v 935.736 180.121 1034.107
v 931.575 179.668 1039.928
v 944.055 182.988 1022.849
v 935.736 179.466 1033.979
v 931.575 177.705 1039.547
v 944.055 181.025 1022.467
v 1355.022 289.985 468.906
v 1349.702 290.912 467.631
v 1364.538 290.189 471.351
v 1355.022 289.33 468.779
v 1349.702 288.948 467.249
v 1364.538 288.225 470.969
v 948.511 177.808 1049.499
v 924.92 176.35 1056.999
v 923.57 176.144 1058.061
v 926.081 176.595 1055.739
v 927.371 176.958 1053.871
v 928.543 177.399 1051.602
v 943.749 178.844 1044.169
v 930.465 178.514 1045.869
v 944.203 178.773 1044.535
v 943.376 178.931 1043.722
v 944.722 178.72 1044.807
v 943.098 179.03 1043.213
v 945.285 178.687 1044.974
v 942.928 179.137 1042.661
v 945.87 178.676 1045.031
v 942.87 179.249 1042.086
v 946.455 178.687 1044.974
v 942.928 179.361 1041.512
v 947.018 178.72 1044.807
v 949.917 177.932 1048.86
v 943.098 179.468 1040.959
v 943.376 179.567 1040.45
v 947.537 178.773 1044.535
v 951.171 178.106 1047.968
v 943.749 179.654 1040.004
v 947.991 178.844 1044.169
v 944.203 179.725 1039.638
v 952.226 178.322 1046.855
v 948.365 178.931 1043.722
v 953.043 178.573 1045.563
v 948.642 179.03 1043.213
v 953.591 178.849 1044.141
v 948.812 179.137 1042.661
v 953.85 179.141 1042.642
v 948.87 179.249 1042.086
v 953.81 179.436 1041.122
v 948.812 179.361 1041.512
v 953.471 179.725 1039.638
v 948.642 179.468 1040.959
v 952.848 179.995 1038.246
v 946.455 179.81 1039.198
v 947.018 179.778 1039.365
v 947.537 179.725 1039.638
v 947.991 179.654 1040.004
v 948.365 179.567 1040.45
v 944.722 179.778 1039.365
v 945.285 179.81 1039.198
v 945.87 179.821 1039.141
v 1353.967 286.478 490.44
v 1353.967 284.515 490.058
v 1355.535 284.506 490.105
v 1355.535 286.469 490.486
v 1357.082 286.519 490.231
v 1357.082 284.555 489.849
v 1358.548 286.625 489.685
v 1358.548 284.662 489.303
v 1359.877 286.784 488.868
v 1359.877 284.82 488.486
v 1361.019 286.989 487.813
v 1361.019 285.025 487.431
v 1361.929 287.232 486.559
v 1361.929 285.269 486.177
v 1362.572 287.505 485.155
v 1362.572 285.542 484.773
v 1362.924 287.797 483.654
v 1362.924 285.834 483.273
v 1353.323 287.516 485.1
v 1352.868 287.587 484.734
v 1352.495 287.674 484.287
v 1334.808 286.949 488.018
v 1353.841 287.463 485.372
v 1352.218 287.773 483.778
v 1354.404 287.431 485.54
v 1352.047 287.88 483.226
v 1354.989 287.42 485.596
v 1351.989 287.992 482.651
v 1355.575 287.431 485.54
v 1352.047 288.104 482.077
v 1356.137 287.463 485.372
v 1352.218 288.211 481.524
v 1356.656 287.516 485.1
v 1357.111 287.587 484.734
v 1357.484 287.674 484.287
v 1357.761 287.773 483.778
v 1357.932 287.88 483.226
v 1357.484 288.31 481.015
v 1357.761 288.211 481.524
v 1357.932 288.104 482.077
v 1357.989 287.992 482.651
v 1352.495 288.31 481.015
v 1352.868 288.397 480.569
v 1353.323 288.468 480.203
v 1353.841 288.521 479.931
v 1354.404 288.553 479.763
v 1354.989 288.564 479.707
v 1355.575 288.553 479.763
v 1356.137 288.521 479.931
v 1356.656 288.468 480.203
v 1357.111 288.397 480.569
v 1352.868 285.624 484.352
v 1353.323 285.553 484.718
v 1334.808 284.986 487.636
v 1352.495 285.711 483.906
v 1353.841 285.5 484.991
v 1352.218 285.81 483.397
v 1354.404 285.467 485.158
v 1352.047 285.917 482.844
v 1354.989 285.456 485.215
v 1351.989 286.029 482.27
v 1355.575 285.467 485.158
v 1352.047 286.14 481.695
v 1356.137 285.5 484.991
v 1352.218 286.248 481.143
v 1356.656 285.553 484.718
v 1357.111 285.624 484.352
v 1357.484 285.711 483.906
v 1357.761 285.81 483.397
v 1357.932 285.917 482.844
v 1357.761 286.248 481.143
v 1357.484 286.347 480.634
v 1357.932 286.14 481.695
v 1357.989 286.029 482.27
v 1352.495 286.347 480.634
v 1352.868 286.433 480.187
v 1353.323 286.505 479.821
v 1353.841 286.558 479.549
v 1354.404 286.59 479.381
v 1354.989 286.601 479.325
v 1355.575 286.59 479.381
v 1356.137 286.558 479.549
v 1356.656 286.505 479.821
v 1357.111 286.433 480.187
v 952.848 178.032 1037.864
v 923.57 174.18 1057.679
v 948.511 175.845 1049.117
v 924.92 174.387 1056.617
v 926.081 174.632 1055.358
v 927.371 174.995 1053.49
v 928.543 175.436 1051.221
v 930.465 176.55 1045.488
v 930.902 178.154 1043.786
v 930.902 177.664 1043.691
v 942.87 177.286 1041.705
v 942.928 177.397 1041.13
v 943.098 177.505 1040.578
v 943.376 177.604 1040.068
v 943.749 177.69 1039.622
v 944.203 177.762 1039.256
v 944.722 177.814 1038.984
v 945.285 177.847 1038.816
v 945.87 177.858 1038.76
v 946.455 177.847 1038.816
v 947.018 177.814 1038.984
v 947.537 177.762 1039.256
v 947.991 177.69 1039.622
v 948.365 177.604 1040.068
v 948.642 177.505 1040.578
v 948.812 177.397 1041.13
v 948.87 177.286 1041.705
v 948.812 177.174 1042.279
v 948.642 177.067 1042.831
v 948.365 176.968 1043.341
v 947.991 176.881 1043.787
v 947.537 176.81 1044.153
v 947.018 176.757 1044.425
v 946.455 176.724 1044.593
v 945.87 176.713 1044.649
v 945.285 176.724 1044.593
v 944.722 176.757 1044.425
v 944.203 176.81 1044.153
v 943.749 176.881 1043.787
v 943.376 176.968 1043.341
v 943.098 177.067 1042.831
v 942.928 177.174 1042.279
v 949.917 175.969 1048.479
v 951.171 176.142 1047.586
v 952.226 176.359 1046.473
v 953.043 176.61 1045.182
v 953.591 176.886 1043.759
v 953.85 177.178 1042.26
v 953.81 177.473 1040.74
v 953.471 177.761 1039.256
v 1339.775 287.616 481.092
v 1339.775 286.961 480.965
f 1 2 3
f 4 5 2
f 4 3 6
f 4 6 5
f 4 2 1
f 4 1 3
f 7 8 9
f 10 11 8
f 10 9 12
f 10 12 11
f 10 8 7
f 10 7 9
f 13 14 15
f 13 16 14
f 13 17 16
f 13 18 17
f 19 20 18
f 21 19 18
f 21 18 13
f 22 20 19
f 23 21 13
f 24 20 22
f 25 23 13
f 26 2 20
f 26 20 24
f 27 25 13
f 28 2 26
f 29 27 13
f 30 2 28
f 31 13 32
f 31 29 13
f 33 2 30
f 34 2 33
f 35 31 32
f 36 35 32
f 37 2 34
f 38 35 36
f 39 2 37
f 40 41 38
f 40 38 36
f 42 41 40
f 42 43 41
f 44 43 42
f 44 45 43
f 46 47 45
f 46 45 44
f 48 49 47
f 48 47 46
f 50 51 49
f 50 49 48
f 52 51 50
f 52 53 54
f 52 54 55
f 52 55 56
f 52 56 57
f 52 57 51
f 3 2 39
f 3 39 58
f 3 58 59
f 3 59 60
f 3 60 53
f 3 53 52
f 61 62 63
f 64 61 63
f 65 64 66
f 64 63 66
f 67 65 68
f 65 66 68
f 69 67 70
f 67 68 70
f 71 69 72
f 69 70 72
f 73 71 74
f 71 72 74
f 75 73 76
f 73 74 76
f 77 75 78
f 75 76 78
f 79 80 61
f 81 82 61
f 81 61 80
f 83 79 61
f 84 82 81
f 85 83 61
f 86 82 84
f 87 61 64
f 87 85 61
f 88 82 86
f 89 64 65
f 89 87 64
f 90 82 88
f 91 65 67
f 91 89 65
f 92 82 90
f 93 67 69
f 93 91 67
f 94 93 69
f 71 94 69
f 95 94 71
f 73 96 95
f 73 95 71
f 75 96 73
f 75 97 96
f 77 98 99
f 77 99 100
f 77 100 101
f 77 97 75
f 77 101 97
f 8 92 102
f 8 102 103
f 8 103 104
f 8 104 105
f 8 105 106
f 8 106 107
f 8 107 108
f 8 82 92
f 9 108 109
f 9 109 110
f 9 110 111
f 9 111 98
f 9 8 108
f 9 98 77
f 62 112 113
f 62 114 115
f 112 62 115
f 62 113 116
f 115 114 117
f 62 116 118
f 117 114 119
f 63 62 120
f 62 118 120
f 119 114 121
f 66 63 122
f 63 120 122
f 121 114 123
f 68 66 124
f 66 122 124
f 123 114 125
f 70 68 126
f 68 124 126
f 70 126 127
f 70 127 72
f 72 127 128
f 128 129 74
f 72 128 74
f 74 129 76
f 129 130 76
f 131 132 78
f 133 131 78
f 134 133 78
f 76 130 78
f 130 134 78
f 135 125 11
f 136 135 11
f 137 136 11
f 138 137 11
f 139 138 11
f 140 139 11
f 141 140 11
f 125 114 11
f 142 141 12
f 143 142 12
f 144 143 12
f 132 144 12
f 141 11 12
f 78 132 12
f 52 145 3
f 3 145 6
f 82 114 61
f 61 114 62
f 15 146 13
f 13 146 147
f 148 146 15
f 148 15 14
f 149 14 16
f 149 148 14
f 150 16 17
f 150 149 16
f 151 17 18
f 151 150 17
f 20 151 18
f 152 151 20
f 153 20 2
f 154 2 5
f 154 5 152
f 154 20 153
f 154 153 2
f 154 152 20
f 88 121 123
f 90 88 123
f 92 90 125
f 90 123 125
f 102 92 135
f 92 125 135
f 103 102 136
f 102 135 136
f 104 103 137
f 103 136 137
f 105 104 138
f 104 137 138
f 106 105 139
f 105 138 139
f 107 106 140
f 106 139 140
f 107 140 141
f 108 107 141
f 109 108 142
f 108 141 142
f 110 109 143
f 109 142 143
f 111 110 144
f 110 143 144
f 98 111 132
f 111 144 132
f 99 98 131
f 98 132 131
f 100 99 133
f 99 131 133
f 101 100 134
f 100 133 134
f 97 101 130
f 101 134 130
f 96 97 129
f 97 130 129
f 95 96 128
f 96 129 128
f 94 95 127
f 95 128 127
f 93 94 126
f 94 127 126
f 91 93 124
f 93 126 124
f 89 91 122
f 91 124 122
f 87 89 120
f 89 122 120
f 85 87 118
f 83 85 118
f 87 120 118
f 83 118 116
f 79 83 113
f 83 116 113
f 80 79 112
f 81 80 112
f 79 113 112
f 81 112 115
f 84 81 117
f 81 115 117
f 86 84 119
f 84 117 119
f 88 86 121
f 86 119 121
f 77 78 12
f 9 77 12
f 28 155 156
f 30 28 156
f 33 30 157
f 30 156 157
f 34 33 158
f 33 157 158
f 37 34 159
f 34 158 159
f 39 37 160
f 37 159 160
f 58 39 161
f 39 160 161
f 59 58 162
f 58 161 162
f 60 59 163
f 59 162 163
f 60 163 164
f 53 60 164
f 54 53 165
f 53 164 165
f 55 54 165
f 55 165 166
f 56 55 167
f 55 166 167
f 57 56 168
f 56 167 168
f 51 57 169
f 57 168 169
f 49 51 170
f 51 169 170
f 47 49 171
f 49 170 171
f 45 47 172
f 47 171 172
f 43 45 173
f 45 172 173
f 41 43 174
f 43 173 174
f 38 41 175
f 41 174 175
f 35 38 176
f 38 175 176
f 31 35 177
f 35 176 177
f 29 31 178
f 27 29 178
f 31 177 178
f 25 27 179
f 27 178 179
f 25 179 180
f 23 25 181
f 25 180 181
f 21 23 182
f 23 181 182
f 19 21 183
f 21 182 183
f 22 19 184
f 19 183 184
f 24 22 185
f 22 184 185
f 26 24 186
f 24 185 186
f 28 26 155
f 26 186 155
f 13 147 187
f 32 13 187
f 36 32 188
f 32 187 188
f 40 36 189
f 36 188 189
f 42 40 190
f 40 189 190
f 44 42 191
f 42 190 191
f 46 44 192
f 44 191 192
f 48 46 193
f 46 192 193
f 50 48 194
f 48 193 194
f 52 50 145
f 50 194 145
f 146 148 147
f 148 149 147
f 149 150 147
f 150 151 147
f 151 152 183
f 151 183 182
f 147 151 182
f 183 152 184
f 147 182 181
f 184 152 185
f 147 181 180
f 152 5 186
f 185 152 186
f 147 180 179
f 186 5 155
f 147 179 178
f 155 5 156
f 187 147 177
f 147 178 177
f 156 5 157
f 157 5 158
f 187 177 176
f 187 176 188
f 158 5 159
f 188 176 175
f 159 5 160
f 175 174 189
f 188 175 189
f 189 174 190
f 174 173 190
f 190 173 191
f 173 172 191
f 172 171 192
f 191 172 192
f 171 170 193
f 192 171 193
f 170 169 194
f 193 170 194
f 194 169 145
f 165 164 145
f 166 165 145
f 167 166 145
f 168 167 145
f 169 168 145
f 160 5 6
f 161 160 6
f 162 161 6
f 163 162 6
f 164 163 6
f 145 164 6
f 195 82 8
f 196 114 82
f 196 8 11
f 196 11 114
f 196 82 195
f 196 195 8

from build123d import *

# Parameters (mm, degrees)
SZKIC1_R                      = 3
DODANIE_WYCI_GNI_CIE1_DEPTH   = 2
DODANIE_WYCI_GNI_CIE1_2_DEPTH = 2


with BuildPart() as part:
    # Szkic1 → Dodanie-wyciągnięcie1 (new body)
    with BuildSketch(Plane(origin=(0, 365.945689179, 71.13263619), x_dir=(-1, 0, 0), z_dir=(0, -0.981627183, -0.190808995))):
        with BuildLine():
            Line((-1362.923797729, -419.854107682), (-1364.538000279, -407.319872061))
            add(Edge.make_bspline(
                [(-1349.701807109, -403.530365456), (-1355.02305477, -404.99505528), (-1359.97623472, -406.256350894), (-1364.538000279, -407.319872061)],
                knots=[0.941558542, 0.941558542, 0.941558542, 0.941558542, 0.993310921, 0.993310921, 0.993310921, 0.993310921], degree=3, weights=[0.880926245, 0.911422555, 0.94603838, 0.984773721]))
            add(Edge.make_bspline(
                [(-1334.808410224, -424.29937802), (-1339.775715665, -417.372446761), (-1344.740184818, -410.449437658), (-1349.701807109, -403.530365456)],
                knots=[0.963874291, 0.963874291, 0.963874291, 0.963874291, 1, 1, 1, 1], degree=3, weights=[0.999942295, 0.999960809, 0.999980044, 1]))
            Line((-1334.808410224, -424.29937802), (-1353.967495394, -426.766751785))
            ThreePointArc((-1353.967495394, -426.766751785), (-1359.877302031, -425.165340681), (-1362.923797729, -419.854107682))
        make_face()
        with Locations((-1354.98932451, -418.832278566)):
            Circle(SZKIC1_R, mode=Mode.SUBTRACT)
    extrude(amount=-DODANIE_WYCI_GNI_CIE1_DEPTH)


with BuildPart() as body_2:
    # Szkic1 → Dodanie-wyci_gni_cie1 2 (new body)
    with BuildSketch(Plane(origin=(0, 365.945689179, 71.13263619), x_dir=(-1, 0, 0), z_dir=(0, -0.981627183, -0.190808995))):
        with BuildLine():
            Line((-952.848375327, -984.825791702), (-944.055127392, -969.140346063))
            add(Edge.make_bspline(
                [(-931.575131618, -986.539510746), (-935.73656816, -980.737805888), (-939.896568771, -974.938081512), (-944.055127392, -969.140346063)],
                knots=[0, 0, 0, 0, 0.029475702, 0.029475702, 0.029475702, 0.029475702], degree=3, weights=[1, 0.999983717, 0.999967915, 0.999952592]))
            add(Edge.make_bspline(
                [(-923.569906868, -1005.011346587), (-923.978106771, -1004.744128104), (-924.361430622, -1004.441990869), (-924.933250587, -1003.922432382), (-925.135186128, -1003.723447225), (-925.5212225, -1003.315189544), (-925.706214443, -1003.105145705), (-926.596451968, -1002.029337731), (-927.201304915, -1001.08702776), (-928.265984349, -999.106110043), (-928.714956529, -998.086344366), (-929.501728034, -996.007731579), (-929.838676077, -994.948585213), (-930.429066466, -992.800937093), (-930.682852112, -991.708936691), (-931.17392663, -989.258796767), (-931.393872963, -987.900039795), (-931.575131618, -986.539510746)],
                knots=[0.533256834, 0.533256834, 0.533256834, 0.533256834, 0.546875, 0.546875, 0.5546875, 0.5546875, 0.5625, 0.5625, 0.59375, 0.59375, 0.625, 0.625, 0.65625, 0.65625, 0.6875, 0.6875, 0.726253318, 0.726253318, 0.726253318, 0.726253318], degree=3))
            Line((-923.569906868, -1005.011346587), (-948.510924792, -996.28936399))
            ThreePointArc((-948.510924792, -996.28936399), (-953.352425834, -991.568871046), (-952.848375327, -984.825791702))
        make_face()
        with Locations((-945.87011042, -988.737801274)):
            Circle(SZKIC1_R, mode=Mode.SUBTRACT)
    extrude(amount=-DODANIE_WYCI_GNI_CIE1_2_DEPTH)


solid = Compound([part.part, body_2.part])
